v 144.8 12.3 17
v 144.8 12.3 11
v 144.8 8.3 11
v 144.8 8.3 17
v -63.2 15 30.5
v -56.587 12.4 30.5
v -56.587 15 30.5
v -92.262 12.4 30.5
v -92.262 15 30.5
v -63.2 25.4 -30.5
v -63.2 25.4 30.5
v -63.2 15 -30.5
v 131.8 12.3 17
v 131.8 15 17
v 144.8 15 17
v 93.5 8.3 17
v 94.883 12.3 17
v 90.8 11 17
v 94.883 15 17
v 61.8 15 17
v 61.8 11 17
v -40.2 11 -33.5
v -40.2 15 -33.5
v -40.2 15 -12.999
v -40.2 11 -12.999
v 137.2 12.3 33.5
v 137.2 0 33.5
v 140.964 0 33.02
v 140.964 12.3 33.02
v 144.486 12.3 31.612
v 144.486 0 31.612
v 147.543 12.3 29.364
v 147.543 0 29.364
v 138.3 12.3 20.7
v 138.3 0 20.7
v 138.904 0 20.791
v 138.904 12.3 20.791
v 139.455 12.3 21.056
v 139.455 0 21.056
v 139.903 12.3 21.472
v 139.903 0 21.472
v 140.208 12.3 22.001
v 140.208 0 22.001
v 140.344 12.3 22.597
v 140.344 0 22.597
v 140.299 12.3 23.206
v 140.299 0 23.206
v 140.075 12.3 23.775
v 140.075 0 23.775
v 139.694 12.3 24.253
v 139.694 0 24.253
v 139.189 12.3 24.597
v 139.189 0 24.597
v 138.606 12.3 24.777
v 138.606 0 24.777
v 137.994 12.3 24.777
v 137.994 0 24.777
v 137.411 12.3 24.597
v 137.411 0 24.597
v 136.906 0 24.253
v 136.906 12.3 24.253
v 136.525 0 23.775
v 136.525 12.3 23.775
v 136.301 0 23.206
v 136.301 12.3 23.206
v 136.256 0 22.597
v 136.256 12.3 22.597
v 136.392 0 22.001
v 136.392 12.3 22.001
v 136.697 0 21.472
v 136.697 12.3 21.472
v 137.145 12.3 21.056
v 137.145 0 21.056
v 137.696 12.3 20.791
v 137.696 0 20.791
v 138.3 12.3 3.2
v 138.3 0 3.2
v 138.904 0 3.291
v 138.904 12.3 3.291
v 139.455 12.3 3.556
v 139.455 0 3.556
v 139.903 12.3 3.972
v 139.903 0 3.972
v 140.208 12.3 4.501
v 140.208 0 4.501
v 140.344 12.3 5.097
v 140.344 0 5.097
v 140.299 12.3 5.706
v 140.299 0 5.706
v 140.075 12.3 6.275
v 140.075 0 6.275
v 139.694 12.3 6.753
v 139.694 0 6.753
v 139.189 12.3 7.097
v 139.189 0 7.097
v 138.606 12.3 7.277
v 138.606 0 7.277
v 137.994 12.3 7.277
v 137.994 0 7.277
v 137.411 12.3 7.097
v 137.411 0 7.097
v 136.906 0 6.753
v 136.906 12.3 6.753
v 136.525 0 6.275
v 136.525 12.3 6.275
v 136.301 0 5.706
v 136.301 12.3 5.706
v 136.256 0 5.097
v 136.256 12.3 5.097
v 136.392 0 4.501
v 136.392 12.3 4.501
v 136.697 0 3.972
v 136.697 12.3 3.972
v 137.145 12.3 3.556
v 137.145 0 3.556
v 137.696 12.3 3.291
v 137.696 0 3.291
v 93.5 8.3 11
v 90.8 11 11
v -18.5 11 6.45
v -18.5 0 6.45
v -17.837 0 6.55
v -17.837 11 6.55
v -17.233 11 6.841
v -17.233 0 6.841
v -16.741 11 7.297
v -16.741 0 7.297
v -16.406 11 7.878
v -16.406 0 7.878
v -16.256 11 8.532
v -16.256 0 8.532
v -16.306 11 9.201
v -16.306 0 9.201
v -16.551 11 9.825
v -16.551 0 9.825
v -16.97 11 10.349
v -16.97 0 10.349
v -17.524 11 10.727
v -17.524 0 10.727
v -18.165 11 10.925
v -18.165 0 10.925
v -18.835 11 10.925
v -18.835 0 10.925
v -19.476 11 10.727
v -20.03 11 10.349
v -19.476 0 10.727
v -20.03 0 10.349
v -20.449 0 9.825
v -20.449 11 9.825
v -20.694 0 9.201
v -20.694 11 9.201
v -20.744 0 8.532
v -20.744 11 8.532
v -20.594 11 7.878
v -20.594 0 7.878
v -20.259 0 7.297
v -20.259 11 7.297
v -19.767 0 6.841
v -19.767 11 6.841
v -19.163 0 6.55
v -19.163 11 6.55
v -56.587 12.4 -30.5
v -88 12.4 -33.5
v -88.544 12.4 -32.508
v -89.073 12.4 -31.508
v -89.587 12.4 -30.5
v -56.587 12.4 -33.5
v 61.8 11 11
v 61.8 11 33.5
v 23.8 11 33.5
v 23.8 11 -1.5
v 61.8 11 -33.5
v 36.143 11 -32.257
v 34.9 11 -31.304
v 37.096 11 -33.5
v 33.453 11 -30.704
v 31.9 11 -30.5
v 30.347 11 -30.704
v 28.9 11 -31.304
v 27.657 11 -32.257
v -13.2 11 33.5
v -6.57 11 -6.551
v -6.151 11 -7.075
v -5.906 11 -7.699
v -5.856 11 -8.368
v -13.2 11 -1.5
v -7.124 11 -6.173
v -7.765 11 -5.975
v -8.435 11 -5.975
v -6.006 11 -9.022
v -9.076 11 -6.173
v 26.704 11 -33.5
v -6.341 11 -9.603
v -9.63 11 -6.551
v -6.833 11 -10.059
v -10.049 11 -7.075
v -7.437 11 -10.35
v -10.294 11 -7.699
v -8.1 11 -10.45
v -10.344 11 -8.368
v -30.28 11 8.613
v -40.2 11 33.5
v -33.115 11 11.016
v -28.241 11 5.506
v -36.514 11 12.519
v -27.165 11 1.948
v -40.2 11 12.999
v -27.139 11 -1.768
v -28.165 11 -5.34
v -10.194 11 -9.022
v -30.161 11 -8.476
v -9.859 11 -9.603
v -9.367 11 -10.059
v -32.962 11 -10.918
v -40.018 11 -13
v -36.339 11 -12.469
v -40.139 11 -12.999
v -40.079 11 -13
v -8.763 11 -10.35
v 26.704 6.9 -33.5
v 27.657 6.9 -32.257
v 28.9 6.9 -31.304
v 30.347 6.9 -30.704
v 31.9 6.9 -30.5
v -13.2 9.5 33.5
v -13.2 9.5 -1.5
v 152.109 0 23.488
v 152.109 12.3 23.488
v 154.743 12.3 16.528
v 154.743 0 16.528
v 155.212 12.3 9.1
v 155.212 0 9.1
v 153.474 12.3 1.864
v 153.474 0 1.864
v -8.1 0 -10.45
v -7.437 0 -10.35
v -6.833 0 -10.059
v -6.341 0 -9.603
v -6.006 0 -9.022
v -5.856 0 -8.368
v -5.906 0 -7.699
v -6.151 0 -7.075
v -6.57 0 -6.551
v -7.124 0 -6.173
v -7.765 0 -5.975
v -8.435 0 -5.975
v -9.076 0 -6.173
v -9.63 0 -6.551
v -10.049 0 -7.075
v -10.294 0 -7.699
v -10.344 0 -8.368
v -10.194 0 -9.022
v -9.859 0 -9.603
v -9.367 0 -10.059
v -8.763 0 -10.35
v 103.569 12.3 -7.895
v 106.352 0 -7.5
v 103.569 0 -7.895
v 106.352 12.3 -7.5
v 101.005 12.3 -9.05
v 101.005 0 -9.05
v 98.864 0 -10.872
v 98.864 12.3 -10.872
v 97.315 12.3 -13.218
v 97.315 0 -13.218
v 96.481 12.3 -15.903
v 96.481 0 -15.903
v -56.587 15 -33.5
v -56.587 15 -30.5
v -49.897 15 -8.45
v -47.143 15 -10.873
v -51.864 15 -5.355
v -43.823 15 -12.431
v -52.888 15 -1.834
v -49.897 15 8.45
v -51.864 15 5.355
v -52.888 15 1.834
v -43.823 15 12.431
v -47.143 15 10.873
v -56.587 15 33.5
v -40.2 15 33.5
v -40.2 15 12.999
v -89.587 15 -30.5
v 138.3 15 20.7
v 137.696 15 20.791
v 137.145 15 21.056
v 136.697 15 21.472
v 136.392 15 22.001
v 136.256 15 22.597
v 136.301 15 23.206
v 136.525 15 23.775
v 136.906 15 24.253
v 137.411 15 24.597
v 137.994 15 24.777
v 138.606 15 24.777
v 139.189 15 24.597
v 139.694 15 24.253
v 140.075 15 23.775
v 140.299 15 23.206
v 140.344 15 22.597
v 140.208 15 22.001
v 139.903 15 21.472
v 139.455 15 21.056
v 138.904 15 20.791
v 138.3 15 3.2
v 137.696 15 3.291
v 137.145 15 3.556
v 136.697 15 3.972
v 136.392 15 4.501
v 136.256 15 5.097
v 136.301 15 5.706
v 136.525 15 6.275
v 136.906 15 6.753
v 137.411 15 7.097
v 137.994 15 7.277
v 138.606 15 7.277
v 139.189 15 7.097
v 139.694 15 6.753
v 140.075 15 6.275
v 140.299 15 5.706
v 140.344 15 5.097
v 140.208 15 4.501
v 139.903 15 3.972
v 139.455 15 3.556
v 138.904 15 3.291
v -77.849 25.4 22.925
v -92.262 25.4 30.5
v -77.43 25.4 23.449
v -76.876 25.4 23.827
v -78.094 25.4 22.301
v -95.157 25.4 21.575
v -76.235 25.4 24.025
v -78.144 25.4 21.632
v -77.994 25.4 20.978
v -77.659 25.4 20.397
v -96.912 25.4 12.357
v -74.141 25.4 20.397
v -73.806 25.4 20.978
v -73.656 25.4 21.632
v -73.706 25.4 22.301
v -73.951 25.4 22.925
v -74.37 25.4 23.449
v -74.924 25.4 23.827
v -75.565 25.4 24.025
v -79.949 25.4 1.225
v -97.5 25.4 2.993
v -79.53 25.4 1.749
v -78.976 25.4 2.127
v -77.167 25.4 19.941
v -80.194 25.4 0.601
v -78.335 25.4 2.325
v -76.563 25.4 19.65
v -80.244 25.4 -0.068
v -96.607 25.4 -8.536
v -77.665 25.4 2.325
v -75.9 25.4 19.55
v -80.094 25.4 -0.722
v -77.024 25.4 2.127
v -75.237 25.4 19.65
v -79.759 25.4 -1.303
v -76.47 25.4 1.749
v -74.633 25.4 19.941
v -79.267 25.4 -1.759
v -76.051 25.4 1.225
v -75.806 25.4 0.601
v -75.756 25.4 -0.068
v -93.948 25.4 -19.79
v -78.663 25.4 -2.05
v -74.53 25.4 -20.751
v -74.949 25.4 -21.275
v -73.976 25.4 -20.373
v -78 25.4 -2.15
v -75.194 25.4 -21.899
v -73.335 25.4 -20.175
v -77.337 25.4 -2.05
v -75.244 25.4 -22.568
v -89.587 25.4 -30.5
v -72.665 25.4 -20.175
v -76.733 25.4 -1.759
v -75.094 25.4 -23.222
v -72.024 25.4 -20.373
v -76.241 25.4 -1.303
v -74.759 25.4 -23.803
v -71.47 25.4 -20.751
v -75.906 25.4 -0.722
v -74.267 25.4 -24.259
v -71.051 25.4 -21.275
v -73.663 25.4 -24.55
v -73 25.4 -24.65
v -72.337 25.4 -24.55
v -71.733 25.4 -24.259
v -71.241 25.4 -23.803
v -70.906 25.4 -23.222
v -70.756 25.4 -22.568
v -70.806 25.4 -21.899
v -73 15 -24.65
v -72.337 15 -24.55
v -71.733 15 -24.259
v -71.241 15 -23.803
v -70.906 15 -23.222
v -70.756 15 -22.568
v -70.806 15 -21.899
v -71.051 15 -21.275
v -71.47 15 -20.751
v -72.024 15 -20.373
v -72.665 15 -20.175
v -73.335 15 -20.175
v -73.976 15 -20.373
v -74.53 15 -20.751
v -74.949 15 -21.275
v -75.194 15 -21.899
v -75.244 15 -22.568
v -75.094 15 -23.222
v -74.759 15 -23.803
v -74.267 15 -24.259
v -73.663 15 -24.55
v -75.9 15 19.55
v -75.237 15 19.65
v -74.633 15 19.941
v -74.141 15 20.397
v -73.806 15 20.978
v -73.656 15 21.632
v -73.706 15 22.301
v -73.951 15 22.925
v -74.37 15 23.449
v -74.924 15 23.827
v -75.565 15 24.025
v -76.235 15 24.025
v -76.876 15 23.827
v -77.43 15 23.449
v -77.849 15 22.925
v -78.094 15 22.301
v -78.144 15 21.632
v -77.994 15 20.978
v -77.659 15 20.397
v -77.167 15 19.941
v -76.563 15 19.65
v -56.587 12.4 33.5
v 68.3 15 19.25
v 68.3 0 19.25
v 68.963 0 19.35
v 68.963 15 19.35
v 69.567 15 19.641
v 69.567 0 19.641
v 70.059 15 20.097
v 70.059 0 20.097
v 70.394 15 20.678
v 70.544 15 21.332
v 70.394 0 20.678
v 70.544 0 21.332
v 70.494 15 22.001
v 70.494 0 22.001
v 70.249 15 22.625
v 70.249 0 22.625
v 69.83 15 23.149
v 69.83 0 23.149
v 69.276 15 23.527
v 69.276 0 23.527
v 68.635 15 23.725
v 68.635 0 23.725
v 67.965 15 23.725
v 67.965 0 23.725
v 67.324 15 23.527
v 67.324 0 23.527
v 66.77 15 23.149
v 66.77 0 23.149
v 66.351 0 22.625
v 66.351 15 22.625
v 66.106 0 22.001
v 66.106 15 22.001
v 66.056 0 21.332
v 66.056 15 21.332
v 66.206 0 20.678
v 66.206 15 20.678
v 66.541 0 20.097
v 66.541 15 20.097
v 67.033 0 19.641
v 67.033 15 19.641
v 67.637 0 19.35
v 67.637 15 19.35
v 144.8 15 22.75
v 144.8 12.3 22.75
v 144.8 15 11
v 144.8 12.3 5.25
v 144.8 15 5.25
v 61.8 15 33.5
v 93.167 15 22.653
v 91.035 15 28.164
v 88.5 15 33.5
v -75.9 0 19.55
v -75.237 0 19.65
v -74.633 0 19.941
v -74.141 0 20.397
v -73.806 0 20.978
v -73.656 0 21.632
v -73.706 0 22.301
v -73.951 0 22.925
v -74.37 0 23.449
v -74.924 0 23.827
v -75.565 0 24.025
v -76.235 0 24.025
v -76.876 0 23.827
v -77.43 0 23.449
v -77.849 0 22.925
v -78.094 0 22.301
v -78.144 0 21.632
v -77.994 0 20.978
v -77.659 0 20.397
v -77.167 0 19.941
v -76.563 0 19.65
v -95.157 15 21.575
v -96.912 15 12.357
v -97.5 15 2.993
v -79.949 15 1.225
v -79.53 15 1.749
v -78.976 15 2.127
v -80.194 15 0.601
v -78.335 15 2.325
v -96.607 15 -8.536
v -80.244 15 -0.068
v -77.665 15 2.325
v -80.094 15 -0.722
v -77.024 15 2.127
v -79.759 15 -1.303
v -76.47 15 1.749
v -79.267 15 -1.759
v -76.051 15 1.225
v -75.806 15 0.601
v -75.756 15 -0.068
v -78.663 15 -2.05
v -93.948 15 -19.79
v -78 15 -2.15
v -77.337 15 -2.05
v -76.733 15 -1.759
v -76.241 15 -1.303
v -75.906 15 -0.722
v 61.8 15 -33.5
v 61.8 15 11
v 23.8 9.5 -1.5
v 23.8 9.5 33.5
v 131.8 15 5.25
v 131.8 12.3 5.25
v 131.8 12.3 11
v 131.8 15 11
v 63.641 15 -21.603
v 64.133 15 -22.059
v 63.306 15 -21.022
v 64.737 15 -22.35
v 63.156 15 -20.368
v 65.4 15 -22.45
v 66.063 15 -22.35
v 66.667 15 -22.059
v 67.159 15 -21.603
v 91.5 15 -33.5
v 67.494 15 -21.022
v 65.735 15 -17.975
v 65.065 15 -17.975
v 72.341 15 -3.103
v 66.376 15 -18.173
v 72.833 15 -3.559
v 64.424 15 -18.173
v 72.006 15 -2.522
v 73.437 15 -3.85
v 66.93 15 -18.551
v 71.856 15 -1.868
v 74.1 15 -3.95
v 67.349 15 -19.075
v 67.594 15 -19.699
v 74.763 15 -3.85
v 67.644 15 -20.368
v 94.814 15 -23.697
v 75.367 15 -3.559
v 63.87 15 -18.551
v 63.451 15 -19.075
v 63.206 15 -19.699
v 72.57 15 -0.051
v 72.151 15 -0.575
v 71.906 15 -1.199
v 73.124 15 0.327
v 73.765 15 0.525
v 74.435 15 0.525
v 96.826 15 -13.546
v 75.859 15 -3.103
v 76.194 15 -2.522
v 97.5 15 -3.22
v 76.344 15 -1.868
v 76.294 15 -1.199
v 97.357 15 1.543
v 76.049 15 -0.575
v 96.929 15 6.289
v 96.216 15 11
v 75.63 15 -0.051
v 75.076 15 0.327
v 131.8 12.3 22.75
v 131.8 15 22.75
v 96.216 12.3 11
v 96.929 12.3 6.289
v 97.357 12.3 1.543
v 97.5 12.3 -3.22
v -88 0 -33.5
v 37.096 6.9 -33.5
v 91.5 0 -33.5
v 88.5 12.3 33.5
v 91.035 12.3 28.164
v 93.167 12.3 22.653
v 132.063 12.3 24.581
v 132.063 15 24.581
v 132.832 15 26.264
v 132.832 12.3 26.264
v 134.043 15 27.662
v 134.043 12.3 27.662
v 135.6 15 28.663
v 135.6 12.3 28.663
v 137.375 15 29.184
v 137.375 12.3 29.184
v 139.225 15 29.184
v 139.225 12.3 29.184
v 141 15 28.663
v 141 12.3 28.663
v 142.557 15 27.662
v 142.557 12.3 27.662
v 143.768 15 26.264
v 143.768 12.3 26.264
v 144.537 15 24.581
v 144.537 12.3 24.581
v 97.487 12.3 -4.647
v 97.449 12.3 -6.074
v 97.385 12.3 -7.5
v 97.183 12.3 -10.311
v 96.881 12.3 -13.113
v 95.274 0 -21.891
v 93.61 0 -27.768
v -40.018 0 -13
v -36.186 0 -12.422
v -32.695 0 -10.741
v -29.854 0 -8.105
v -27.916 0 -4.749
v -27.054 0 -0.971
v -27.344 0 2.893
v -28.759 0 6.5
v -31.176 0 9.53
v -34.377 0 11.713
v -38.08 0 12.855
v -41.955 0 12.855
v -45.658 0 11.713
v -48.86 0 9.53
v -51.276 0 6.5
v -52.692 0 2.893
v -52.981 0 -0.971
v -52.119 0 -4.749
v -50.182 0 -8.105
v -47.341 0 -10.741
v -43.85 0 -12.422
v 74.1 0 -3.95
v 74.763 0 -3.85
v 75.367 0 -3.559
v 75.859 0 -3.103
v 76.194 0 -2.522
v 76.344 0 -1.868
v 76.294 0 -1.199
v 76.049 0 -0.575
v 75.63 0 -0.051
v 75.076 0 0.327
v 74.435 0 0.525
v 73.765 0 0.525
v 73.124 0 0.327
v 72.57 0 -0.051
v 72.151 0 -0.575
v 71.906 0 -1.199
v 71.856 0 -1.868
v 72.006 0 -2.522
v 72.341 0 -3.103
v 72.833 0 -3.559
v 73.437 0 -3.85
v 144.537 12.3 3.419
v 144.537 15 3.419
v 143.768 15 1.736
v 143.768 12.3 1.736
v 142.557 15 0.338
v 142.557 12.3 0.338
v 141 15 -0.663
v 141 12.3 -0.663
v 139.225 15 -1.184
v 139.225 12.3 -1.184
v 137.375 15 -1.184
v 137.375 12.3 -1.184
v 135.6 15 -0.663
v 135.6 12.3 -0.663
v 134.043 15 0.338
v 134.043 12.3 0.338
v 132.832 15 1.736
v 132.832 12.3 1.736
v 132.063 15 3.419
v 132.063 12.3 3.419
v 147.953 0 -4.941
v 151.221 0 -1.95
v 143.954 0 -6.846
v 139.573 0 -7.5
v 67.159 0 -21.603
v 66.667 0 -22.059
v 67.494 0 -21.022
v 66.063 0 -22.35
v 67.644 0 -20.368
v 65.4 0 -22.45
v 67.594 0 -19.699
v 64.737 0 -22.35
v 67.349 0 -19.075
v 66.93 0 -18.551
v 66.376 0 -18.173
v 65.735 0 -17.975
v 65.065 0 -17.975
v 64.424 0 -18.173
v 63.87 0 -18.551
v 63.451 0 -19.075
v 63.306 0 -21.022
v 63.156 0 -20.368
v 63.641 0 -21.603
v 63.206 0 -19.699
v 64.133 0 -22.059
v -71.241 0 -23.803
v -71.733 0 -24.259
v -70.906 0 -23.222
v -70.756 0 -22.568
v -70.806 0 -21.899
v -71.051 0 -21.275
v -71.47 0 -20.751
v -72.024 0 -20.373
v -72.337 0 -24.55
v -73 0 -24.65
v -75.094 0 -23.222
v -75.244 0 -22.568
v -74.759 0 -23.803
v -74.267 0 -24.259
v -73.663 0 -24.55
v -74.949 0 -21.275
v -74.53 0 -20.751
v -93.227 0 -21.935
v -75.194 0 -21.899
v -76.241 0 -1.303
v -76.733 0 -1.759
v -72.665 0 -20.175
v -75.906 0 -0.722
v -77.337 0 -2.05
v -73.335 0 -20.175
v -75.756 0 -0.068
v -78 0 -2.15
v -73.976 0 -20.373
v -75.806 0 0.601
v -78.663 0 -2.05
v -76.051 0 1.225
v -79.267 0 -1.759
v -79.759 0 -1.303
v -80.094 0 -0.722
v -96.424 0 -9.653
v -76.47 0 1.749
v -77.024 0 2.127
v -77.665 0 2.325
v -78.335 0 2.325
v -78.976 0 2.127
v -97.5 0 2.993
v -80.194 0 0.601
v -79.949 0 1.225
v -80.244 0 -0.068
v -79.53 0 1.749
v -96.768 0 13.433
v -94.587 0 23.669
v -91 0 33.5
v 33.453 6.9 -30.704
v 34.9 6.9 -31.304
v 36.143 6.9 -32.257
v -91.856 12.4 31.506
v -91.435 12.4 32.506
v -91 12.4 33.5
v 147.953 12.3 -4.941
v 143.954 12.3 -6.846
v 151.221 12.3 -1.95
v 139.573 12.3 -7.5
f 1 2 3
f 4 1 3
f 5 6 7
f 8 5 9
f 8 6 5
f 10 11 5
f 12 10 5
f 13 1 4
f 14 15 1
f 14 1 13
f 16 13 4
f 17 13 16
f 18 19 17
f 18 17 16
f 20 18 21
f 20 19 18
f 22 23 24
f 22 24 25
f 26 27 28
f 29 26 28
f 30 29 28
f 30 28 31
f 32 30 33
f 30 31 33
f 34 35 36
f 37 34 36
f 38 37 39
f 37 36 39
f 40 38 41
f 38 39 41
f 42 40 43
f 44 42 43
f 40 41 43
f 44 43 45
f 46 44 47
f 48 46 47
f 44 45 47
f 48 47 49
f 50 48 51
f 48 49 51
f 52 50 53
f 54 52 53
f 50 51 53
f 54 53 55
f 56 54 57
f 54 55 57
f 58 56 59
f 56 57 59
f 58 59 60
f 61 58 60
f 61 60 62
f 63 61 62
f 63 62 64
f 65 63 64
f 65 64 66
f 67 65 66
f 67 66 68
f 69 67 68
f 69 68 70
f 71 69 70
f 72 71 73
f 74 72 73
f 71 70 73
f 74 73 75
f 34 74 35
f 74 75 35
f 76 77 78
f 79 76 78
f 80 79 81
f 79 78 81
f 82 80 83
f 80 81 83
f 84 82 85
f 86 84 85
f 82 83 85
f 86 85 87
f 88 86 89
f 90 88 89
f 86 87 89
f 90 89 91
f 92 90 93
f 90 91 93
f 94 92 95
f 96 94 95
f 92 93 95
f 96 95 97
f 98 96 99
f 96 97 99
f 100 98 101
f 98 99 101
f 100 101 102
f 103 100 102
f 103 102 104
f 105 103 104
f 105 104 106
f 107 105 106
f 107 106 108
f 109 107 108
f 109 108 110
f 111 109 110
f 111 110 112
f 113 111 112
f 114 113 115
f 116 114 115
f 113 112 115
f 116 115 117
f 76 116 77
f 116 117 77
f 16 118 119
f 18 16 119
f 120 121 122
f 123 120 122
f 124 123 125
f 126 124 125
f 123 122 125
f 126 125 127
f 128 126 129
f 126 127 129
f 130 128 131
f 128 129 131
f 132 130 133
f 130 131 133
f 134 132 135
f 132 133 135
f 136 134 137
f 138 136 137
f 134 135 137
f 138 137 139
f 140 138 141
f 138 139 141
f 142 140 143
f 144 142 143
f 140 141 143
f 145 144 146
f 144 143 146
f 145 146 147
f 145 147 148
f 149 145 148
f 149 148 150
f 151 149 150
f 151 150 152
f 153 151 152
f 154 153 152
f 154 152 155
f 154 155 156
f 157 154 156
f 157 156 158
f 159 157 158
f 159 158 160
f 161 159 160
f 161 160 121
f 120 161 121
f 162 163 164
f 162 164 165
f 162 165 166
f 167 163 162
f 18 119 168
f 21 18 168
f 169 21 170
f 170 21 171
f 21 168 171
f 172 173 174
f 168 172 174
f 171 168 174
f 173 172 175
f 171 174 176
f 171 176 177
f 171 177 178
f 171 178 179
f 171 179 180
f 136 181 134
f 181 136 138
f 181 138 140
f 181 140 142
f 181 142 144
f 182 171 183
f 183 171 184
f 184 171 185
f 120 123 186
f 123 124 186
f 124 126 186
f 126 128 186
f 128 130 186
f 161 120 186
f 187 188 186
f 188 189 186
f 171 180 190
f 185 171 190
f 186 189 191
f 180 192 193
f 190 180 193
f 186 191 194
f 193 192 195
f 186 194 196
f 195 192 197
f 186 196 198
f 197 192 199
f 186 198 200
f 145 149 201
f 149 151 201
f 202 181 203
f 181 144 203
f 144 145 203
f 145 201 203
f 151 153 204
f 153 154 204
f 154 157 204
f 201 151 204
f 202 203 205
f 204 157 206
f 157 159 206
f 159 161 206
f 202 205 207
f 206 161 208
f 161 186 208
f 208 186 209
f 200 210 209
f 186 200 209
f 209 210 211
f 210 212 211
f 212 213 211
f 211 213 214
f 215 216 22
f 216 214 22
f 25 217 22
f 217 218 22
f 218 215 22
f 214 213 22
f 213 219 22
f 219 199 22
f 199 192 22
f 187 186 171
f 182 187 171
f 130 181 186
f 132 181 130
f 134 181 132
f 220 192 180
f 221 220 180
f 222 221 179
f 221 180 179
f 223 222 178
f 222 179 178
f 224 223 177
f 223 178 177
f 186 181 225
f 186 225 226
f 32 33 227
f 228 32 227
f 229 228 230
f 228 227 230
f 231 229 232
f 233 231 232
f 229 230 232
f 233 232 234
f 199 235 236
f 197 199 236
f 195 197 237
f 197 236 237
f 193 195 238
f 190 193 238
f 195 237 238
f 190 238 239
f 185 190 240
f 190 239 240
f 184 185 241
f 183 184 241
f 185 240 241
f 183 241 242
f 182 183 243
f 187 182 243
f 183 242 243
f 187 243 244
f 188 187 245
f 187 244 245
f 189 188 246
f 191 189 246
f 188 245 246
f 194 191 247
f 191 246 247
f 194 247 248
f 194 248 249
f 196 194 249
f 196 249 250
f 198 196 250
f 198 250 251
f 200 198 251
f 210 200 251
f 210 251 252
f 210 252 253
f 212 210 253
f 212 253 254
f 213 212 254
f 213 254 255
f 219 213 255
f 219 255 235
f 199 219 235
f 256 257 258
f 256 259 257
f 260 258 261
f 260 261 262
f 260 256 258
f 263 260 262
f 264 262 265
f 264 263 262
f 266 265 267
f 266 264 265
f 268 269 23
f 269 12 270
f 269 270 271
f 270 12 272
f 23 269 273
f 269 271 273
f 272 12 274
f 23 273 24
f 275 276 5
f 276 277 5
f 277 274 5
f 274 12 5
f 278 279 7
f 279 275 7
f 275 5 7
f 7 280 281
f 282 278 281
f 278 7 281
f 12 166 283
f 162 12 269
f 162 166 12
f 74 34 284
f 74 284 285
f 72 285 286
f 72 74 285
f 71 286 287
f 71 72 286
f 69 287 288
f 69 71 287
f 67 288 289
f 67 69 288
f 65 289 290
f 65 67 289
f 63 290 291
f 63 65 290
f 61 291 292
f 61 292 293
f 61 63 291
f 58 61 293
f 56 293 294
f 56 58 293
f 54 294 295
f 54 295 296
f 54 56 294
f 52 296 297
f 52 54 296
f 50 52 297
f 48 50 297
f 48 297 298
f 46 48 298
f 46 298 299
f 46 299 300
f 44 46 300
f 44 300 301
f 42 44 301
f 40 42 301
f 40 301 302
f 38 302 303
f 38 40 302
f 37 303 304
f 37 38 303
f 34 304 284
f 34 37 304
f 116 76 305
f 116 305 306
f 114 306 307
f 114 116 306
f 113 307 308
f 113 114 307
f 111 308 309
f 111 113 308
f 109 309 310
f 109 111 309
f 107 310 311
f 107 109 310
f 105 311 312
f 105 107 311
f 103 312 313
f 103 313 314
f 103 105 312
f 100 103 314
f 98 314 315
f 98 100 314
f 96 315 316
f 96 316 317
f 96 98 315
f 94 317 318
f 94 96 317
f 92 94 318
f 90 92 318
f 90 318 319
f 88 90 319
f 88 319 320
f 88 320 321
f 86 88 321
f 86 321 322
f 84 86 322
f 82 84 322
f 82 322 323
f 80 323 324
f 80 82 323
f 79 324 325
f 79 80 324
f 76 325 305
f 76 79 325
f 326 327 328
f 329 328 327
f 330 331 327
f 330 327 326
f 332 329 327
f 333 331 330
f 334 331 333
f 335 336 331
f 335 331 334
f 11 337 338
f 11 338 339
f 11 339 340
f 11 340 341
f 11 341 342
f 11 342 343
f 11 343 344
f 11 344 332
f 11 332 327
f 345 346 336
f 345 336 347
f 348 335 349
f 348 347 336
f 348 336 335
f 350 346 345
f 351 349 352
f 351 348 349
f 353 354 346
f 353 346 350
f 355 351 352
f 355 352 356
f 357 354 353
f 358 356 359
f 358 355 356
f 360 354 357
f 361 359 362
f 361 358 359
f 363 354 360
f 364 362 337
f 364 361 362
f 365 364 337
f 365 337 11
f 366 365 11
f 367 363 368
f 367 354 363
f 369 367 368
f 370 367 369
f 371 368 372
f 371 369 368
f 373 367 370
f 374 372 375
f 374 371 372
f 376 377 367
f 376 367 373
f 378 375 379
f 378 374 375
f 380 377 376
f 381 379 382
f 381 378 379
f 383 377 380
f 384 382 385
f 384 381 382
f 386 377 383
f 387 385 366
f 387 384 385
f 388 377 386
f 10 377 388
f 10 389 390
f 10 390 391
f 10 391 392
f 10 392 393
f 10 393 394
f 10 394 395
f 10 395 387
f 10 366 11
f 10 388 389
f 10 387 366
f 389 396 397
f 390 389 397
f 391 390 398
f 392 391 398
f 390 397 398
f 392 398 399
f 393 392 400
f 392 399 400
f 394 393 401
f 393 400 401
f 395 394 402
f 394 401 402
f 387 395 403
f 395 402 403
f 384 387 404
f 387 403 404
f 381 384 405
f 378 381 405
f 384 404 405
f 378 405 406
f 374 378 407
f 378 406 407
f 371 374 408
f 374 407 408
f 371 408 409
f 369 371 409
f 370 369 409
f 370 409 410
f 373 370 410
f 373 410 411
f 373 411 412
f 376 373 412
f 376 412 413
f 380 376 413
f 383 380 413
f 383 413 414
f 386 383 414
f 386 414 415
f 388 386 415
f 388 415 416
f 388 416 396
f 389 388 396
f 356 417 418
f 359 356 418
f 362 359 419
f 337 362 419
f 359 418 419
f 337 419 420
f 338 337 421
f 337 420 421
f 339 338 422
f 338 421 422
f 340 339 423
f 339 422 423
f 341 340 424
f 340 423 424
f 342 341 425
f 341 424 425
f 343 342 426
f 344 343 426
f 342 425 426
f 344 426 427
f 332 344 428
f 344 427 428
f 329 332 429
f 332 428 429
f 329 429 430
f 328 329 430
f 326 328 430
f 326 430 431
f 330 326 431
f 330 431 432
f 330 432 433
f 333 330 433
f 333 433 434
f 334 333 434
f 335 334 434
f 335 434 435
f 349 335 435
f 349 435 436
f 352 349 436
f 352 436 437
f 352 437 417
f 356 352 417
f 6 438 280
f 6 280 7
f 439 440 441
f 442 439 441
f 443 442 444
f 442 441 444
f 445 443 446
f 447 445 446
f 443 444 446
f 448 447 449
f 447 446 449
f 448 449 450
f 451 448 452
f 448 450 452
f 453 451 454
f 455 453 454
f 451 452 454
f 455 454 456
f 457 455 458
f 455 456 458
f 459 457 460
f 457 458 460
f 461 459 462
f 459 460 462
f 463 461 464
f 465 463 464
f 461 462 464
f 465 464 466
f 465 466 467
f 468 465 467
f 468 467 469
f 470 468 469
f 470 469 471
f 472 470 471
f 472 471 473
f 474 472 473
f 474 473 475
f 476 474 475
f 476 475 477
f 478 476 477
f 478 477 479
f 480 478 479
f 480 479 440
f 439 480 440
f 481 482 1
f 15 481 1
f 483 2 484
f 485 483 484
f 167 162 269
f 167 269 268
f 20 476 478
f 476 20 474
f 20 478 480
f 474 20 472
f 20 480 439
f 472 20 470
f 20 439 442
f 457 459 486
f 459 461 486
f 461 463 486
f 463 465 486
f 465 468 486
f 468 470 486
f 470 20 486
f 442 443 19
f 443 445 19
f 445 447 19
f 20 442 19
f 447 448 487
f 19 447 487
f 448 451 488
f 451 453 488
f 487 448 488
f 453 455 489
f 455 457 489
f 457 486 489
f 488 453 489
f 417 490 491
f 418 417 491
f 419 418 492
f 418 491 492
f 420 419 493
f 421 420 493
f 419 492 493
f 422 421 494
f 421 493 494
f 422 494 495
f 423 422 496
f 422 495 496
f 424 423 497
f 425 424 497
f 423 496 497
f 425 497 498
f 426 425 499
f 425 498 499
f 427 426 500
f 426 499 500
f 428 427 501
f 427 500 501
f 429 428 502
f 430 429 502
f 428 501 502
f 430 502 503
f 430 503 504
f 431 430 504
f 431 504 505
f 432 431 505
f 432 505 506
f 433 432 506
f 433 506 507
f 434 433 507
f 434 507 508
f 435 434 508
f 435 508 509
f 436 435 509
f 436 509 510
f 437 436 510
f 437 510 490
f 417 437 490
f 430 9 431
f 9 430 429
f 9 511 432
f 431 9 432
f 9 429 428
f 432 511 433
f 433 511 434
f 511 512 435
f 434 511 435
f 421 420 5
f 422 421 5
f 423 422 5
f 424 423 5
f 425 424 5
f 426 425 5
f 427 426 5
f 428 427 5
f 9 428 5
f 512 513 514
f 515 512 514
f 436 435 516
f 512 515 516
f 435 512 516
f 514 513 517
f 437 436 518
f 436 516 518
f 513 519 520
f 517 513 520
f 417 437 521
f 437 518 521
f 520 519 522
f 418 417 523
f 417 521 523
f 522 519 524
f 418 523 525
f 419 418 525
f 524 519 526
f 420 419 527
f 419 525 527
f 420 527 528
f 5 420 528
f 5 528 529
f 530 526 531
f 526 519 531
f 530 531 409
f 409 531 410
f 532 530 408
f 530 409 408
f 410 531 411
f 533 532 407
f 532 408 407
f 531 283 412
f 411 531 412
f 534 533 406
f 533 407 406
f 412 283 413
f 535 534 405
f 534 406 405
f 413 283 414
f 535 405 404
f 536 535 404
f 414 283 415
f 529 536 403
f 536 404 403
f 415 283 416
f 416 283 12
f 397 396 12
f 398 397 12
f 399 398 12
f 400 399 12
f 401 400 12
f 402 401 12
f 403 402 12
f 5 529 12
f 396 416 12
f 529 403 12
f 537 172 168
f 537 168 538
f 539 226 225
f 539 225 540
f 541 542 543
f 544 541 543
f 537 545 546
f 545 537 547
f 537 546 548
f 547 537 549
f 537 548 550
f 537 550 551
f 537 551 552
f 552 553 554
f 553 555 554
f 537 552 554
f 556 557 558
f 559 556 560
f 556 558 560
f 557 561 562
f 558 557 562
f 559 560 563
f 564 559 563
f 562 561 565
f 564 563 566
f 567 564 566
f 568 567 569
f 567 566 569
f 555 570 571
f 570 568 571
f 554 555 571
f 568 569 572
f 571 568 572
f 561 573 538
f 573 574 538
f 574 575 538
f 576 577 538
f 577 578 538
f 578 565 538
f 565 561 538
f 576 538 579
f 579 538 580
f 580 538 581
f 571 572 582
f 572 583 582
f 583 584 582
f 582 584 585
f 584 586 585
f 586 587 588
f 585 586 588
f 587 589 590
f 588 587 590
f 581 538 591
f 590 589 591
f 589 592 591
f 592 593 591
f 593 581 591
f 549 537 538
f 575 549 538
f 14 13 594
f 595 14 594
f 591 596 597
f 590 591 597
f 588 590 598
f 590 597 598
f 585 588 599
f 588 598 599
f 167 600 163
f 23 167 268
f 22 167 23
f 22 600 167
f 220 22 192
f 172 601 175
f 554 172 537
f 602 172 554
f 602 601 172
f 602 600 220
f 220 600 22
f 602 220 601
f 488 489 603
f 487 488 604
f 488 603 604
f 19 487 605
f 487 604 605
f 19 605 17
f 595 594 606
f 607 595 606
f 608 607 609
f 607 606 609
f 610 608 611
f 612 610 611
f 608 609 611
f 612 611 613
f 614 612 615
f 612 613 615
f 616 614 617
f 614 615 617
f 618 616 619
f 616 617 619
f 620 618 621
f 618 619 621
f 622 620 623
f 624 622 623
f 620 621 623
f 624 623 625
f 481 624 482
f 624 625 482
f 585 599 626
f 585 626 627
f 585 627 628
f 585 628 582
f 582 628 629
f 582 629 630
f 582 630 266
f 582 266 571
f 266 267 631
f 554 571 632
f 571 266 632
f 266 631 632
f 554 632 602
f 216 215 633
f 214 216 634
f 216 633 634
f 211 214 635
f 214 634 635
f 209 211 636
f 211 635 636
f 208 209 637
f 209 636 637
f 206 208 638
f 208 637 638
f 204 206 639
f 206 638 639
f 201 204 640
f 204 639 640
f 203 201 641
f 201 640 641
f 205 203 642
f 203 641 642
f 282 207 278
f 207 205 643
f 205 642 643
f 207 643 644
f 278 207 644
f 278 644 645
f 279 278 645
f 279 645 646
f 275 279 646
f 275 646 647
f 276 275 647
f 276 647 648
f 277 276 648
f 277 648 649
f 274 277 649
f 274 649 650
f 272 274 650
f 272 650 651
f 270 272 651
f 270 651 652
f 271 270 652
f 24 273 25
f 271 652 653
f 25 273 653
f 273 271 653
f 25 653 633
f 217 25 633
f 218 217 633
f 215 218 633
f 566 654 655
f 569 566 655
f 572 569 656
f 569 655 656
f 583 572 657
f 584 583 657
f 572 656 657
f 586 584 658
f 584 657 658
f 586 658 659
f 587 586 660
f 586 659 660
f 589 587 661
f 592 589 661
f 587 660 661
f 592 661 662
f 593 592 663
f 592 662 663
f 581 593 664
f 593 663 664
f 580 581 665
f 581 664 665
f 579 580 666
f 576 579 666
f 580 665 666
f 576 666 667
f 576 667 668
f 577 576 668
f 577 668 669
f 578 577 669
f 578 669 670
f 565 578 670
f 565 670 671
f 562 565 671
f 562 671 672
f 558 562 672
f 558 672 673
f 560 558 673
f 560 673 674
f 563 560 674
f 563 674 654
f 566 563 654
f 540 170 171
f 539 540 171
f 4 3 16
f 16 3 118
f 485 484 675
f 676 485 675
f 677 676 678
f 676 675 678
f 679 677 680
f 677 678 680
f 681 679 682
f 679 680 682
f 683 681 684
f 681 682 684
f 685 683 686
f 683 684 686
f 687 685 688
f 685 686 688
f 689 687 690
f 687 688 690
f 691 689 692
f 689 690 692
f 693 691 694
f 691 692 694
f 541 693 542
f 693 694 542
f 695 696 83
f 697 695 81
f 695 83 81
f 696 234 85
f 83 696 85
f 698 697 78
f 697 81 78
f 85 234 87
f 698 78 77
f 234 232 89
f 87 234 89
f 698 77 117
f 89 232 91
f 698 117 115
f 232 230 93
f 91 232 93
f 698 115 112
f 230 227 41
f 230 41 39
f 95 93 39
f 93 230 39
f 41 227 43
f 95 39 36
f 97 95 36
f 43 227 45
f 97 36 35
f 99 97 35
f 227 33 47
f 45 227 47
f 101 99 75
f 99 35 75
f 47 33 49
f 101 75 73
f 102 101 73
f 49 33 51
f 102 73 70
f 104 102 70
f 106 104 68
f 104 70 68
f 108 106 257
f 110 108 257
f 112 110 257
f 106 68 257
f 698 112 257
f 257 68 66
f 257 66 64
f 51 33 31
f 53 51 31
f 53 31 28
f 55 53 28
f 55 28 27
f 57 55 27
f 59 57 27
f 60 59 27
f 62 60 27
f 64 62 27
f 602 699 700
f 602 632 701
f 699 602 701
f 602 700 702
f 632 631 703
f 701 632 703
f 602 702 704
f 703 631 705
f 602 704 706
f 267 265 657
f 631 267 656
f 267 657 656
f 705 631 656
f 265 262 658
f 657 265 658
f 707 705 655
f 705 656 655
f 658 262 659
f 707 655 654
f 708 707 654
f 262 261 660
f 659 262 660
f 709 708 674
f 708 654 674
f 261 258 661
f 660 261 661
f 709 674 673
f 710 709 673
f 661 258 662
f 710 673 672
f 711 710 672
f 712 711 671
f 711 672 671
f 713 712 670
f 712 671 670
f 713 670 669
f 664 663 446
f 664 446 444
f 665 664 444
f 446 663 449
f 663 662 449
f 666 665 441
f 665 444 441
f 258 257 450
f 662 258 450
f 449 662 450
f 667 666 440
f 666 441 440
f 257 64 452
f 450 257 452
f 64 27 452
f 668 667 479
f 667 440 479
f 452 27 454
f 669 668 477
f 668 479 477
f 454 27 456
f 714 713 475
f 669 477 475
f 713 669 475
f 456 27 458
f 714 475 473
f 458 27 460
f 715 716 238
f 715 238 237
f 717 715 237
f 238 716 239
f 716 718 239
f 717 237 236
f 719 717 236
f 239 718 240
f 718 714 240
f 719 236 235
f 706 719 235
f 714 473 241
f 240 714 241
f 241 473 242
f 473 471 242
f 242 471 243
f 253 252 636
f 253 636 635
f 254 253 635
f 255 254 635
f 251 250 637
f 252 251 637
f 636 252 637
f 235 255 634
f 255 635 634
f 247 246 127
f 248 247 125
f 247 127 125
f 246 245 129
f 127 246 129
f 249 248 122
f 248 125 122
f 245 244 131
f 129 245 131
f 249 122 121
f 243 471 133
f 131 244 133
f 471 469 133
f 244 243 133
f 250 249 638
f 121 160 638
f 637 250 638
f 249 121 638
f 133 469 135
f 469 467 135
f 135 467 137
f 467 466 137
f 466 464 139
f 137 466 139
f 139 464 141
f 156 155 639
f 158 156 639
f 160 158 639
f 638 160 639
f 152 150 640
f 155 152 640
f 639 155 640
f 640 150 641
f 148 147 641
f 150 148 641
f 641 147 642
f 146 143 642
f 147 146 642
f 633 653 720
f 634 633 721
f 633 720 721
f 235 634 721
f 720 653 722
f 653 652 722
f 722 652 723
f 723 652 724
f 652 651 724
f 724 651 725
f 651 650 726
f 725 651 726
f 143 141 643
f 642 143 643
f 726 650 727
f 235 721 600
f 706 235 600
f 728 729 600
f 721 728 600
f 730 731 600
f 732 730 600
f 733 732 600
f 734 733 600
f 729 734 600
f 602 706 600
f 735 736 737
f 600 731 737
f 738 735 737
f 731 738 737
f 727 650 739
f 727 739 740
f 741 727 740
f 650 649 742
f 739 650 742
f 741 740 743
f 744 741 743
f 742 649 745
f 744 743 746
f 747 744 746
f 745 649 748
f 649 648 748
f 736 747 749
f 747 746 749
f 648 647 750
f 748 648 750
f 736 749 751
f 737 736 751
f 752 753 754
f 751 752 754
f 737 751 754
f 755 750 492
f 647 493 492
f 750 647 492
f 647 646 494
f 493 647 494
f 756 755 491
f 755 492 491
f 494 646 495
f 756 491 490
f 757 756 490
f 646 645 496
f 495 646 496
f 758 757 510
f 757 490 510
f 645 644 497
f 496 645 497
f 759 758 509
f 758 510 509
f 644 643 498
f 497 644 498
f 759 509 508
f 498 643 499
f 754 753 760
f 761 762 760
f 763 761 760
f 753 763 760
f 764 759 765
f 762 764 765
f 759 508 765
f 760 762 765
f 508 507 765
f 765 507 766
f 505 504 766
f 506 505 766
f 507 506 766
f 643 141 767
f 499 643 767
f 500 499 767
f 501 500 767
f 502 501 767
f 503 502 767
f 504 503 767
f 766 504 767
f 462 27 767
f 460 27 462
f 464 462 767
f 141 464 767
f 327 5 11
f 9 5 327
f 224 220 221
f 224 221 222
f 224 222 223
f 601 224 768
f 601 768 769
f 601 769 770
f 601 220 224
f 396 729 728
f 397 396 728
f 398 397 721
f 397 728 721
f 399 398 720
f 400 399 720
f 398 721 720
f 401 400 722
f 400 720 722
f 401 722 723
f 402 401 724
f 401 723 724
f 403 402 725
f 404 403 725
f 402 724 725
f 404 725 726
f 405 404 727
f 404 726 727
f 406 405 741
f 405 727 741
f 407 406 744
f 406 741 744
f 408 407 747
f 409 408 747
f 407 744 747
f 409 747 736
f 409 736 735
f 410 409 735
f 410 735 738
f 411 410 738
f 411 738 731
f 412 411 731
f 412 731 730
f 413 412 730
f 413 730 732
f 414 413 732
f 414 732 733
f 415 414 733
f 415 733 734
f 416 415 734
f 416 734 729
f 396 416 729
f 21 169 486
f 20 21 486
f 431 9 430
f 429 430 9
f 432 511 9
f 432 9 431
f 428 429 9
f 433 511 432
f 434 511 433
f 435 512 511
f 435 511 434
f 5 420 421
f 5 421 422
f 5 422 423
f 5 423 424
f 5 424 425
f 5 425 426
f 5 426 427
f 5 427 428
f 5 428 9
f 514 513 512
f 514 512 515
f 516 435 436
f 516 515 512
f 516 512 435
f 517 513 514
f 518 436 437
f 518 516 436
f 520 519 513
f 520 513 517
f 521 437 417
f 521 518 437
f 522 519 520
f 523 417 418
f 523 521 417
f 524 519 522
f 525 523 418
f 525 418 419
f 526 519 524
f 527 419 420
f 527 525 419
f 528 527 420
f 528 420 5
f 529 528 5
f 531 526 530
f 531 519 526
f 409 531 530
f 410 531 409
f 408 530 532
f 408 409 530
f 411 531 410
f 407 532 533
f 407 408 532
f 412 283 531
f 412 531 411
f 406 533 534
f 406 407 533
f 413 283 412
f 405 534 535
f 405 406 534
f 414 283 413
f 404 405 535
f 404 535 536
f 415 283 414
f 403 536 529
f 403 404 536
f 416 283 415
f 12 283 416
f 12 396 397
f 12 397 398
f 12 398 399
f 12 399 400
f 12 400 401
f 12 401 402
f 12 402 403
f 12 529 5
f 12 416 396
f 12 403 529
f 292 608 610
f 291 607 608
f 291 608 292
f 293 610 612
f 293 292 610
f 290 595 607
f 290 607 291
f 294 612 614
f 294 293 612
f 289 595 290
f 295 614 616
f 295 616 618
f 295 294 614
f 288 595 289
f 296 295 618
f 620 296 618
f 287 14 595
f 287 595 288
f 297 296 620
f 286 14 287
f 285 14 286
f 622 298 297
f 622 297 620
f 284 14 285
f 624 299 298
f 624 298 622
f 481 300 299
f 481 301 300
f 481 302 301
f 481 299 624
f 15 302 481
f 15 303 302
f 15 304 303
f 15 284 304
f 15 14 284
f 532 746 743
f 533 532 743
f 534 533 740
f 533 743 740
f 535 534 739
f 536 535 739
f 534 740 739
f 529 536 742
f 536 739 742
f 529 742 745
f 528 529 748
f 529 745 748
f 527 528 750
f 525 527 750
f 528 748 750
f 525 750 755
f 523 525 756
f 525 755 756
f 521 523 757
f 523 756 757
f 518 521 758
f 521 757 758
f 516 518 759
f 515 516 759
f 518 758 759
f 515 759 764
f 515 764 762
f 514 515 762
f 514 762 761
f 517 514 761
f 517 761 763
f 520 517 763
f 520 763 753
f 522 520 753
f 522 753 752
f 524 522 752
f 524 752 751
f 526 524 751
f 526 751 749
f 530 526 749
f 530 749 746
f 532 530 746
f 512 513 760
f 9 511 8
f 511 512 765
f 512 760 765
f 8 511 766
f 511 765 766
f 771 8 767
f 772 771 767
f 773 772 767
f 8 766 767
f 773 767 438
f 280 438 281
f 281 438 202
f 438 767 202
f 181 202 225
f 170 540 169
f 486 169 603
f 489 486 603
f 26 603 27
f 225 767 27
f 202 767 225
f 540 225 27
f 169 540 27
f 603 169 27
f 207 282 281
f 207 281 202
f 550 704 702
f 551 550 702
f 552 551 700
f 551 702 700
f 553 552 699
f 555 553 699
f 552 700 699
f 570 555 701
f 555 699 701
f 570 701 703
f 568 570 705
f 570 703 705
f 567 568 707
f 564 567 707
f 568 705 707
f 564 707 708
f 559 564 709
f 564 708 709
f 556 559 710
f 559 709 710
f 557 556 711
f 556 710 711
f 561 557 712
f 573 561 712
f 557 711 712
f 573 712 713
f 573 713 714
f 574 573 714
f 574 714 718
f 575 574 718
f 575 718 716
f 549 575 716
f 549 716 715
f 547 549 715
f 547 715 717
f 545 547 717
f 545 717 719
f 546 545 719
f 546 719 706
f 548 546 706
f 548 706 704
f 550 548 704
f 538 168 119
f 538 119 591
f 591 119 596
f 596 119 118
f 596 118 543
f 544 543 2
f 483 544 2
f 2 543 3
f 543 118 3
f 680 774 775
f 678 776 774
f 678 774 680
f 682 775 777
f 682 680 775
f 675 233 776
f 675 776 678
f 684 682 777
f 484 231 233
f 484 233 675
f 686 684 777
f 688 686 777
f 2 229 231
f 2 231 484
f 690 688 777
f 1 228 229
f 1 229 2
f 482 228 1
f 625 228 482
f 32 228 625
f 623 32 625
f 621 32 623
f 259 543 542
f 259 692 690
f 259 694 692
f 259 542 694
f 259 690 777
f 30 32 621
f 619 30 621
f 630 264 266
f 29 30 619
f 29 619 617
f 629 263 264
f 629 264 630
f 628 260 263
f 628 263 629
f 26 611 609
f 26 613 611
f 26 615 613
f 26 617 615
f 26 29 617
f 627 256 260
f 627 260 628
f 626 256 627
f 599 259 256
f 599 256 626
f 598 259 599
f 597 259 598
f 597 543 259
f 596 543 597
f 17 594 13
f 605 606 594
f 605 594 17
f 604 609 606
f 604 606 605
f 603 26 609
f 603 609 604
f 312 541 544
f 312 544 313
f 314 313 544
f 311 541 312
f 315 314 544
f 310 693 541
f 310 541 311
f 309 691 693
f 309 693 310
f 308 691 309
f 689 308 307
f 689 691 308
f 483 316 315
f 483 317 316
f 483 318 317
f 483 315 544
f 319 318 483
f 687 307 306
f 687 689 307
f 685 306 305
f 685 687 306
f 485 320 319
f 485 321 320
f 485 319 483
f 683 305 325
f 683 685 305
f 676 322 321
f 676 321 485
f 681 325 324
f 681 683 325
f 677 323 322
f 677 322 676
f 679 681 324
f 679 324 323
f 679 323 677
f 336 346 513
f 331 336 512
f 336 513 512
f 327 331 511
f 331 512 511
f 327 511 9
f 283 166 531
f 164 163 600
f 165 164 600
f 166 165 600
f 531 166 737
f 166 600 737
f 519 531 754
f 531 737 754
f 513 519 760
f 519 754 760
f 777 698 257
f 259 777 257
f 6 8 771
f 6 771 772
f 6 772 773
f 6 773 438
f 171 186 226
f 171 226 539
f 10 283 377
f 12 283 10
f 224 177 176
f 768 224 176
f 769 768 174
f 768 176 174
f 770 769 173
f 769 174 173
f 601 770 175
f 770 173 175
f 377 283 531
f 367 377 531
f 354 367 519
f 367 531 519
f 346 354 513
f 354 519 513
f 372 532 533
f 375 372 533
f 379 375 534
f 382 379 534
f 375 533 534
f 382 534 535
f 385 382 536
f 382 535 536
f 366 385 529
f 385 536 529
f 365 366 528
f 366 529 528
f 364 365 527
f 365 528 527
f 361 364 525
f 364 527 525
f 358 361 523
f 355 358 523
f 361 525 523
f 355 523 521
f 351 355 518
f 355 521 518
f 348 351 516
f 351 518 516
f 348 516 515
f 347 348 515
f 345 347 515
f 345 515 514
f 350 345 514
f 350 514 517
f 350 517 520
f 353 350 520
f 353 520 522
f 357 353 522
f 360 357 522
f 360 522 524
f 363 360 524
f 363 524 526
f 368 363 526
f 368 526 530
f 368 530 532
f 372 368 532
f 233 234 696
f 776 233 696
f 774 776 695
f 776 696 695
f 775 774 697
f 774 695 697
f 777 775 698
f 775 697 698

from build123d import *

# Parameters (mm, degrees)
SKETCH1_W           = 195
SKETCH1_H           = 67
BOSS_EXTRUDE1_DEPTH = 25.4
CUT_EXTRUDE1_DEPTH  = 107.177492907
CUT_EXTRUDE2_DEPTH  = 121.997561959
CUT_EXTRUDE3_START  = -13
SKETCH4_W           = 6.612655346
SKETCH4_H           = 3
CUT_EXTRUDE3_DEPTH  = 13
SKETCH6_R           = 2.25
CUT_EXTRUDE4_DEPTH  = 107.177492907
SKETCH7_W           = 37
SKETCH7_H           = 35
CUT_EXTRUDE5_DEPTH  = 1.5
CUT_EXTRUDE6_DEPTH  = 18.5
SKETCH9_R           = 2.05
BOSS_EXTRUDE2_DEPTH = 12.3
FILLET1_R           = 10
SKETCH10_R          = 13
CUT_EXTRUDE7_DEPTH  = 161.89488962
SKETCH11_R          = 2.05
BOSS_EXTRUDE3_DEPTH = 2.7
CUT_EXTRUDE8_DEPTH  = 6


# Read off the part's stored shape, not the designer's step: Split1
with BuildPart() as part:
    # Sketch1 → Boss-Extrude1 (new body)
    with BuildSketch(Plane(origin=(0, 0, 0), x_dir=(1, 0, 0), z_dir=(0, 1, 0))):
        Rectangle(SKETCH1_W, SKETCH1_H)
    extrude(amount=BOSS_EXTRUDE1_DEPTH)

    # Sketch2 → Cut-Extrude1 (cut, through all)
    with BuildSketch(Plane.XZ):
        with BuildLine():
            Line((97.5, -3.219751644), (97.5, 33.5))
            Line((97.5, 33.5), (88.5, 33.5))
            ThreePointArc((88.5, 33.5), (95.217186872, 15.683556008), (97.5, -3.219751644))
        make_face()
        with BuildLine():
            Line((97.5, -33.5), (97.5, -3.219751644))
            ThreePointArc((97.5, -3.219751644), (95.985558513, -18.65423771), (91.5, -33.5))
            Line((91.5, -33.5), (97.5, -33.5))
        make_face()
        with BuildLine():
            ThreePointArc((-88, -33.5), (-95.08607052, -15.861694529), (-97.5, 2.992884749))
            Line((-97.5, 2.992884749), (-97.5, -33.5))
            Line((-97.5, -33.5), (-88, -33.5))
        make_face()
        with BuildLine():
            ThreePointArc((-97.5, 2.992884749), (-95.856964648, 18.588830376), (-91, 33.5))
            Line((-91, 33.5), (-97.5, 33.5))
            Line((-97.5, 33.5), (-97.5, 2.992884749))
        make_face()
    extrude(amount=-CUT_EXTRUDE1_DEPTH, mode=Mode.SUBTRACT)

    # Sketch3 → Cut-Extrude2 (cut, through all)
    with BuildSketch(Plane(origin=(0, 0, 33.5), x_dir=(-1, 0, 0), z_dir=(0, 0, -1))):
        Polygon((63.2, 25.4), (63.2, 15), (40.2, 15), (40.2, 11), (-61.8, 11), (-61.8, 15), (-97.5, 15), (-97.5, 25.4), align=None)
    extrude(amount=CUT_EXTRUDE2_DEPTH, mode=Mode.SUBTRACT)

    # Sketch4 → Cut-Extrude3 (cut)
    with BuildSketch(Plane(origin=(0, 25.4, 0), x_dir=(1, 0, 0), z_dir=(0, 1, 0)).offset(CUT_EXTRUDE3_START)):
        with BuildLine():
            Line((-63.2, 30.5), (-63.2, 33.5))
            Line((-63.2, 33.5), (-88, 33.5))
            ThreePointArc((-88, 33.5), (-88.810680862, 32.008999469), (-89.587344654, 30.5))
            Line((-89.587344654, 30.5), (-63.2, 30.5))
        make_face()
        with Locations((-59.893672327, 32)):
            Rectangle(SKETCH4_W, SKETCH4_H)
        with BuildLine():
            Line((-63.2, -33.5), (-63.2, -30.5))
            Line((-63.2, -30.5), (-92.261692194, -30.5))
            ThreePointArc((-92.261692194, -30.5), (-91.647155152, -32.006859002), (-91, -33.5))
            Line((-91, -33.5), (-63.2, -33.5))
        make_face()
        with Locations((-59.893672327, -32)):
            Rectangle(SKETCH4_W, SKETCH4_H)
    extrude(amount=CUT_EXTRUDE3_DEPTH, mode=Mode.SUBTRACT)

    # Sketch6 → Cut-Extrude4 (cut, through all)
    with BuildSketch(Plane.XZ):
        with Locations(Location((-18.5, 8.7, 0), (0, 0, 270))):
            Circle(SKETCH6_R)
        with Locations(Location((74.1, -1.7, 0), (0, 0, 270))):
            Circle(SKETCH6_R)
        with Locations(Location((68.3, 21.5, 0), (0, 0, 270))):
            Circle(SKETCH6_R)
        with Locations(Location((65.4, -20.2, 0), (0, 0, 270))):
            Circle(SKETCH6_R)
        with Locations(Location((-8.1, -8.2, 0), (0, 0, 270))):
            Circle(SKETCH6_R)
        with Locations(Location((-75.9, 21.8, 0), (0, 0, 270))):
            Circle(SKETCH6_R)
        with Locations(Location((-78, 0.1, 0), (0, 0, 270))):
            Circle(SKETCH6_R)
        with Locations(Location((-73, -22.4, 0), (0, 0, 270))):
            Circle(SKETCH6_R)
    extrude(amount=-CUT_EXTRUDE4_DEPTH, mode=Mode.SUBTRACT)

    # Sketch7 → Cut-Extrude5 (cut)
    with BuildSketch(Plane(origin=(0, 11, 0), x_dir=(1, 0, 0), z_dir=(0, 1, 0))):
        with Locations((5.3, -16)):
            Rectangle(SKETCH7_W, SKETCH7_H)
    extrude(amount=-CUT_EXTRUDE5_DEPTH, mode=Mode.SUBTRACT)

    # Sketch8 → Cut-Extrude6 (cut)
    with BuildSketch(Plane(origin=(0, 25.4, 0), x_dir=(1, 0, 0), z_dir=(0, 1, 0))):
        with BuildLine():
            Line((37.096152423, 33.5), (31.9, 33.5))
            Line((31.9, 33.5), (31.9, 30.5))
            ThreePointArc((31.9, 30.5), (34.9, 31.303847577), (37.096152423, 33.5))
        make_face()
        with BuildLine():
            Line((31.9, 33.5), (26.703847577, 33.5))
            ThreePointArc((26.703847577, 33.5), (28.9, 31.303847577), (31.9, 30.5))
            Line((31.9, 30.5), (31.9, 33.5))
        make_face()
    extrude(amount=-CUT_EXTRUDE6_DEPTH, mode=Mode.SUBTRACT)

    # Sketch9 → Boss-Extrude2 (add)
    with BuildSketch(Plane.XZ):
        with BuildLine():
            Line((88.5, 33.5), (137.200361796, 33.5))
            ThreePointArc((137.200361796, 33.5), (142.769729546, 32.427747228), (147.542861296, 29.364285714))
            ThreePointArc((147.542861296, 29.364285714), (154.743476693, 16.527679502), (153.473750823, 1.864285714))
            ThreePointArc((153.473750823, 1.864285714), (147.953179578, -4.940573023), (139.572717606, -7.5))
            Line((139.572717606, -7.5), (97.384558849, -7.5))
            ThreePointArc((97.384558849, -7.5), (95.698800641, 13.597328658), (88.5, 33.5))
        make_face()
        with Locations(Location((138.3, 5.25, 0), (0, 0, 270))):
            Circle(SKETCH9_R, mode=Mode.SUBTRACT)
        with Locations(Location((138.3, 22.75, 0), (0, 0, 270))):
            Circle(SKETCH9_R, mode=Mode.SUBTRACT)
    extrude(amount=-BOSS_EXTRUDE2_DEPTH)

    # Fillet1
    fillet1_edges = [part.edges().sort_by_distance(p)[0] for p in [
        (97.384558849, 6.15, -7.5),
    ]]
    fillet(fillet1_edges, radius=FILLET1_R)

    # Sketch10 → Cut-Extrude7 (cut, through all)
    with BuildSketch(Plane.XZ):
        with Locations(Location((-40.017782272, 0, 0), (0, 0, 270))):
            Circle(SKETCH10_R)
    extrude(amount=-CUT_EXTRUDE7_DEPTH, mode=Mode.SUBTRACT)

    # Sketch11 → Boss-Extrude3 (add)
    # profile 1 of 2: a face of its own
    with BuildSketch(Plane(origin=(0, 12.3, 0), x_dir=(1, 0, 0), z_dir=(0, 1, 0))):
        with BuildLine():
            Line((144.8, -11), (144.8, -5.25))
            ThreePointArc((144.8, -5.25), (138.3, 1.25), (131.8, -5.25))
            Line((131.8, -5.25), (131.8, -11))
            Line((131.8, -11), (144.8, -11))
        make_face()
        with Locations(Location((138.3, -5.25, 0), (0, 0, 90))):
            Circle(SKETCH11_R, mode=Mode.SUBTRACT)
    # profile 2 of 2: a face of its own
    with BuildSketch(Plane(origin=(0, 12.3, 0), x_dir=(1, 0, 0), z_dir=(0, 1, 0))):
        with BuildLine():
            Line((144.8, -22.75), (144.8, -17))
            Line((144.8, -17), (131.8, -17))
            Line((131.8, -17), (131.8, -22.75))
            ThreePointArc((131.8, -22.75), (138.3, -29.25), (144.8, -22.75))
        make_face()
        with Locations(Location((138.3, -22.75, 0), (0, 0, 90))):
            Circle(SKETCH11_R, mode=Mode.SUBTRACT)
    extrude(amount=BOSS_EXTRUDE3_DEPTH)

    # Sketch12 → Cut-Extrude8 (cut)
    with BuildSketch(Plane.XY.offset(11)):
        Polygon((144.8, 15), (144.8, 8.3), (93.5, 8.3), (90.8, 11), (61.8, 11), (61.8, 15), align=None)
    extrude(amount=CUT_EXTRUDE8_DEPTH, mode=Mode.SUBTRACT)


with BuildPart() as body_2:
    # Split1: the piece on the far side of the plane
    add(part.part)
    split(bisect_by=Plane(origin=(0, 15, 0), x_dir=(1, 0, 0), z_dir=(0, 1, 0)), keep=Keep.BOTTOM)


with BuildPart() as part_1:
    add(part.part)

    # Split1
    split(bisect_by=Plane(origin=(0, 15, 0), x_dir=(1, 0, 0), z_dir=(0, 1, 0)), keep=Keep.TOP)


solid = Compound([body_2.part, part_1.part])
